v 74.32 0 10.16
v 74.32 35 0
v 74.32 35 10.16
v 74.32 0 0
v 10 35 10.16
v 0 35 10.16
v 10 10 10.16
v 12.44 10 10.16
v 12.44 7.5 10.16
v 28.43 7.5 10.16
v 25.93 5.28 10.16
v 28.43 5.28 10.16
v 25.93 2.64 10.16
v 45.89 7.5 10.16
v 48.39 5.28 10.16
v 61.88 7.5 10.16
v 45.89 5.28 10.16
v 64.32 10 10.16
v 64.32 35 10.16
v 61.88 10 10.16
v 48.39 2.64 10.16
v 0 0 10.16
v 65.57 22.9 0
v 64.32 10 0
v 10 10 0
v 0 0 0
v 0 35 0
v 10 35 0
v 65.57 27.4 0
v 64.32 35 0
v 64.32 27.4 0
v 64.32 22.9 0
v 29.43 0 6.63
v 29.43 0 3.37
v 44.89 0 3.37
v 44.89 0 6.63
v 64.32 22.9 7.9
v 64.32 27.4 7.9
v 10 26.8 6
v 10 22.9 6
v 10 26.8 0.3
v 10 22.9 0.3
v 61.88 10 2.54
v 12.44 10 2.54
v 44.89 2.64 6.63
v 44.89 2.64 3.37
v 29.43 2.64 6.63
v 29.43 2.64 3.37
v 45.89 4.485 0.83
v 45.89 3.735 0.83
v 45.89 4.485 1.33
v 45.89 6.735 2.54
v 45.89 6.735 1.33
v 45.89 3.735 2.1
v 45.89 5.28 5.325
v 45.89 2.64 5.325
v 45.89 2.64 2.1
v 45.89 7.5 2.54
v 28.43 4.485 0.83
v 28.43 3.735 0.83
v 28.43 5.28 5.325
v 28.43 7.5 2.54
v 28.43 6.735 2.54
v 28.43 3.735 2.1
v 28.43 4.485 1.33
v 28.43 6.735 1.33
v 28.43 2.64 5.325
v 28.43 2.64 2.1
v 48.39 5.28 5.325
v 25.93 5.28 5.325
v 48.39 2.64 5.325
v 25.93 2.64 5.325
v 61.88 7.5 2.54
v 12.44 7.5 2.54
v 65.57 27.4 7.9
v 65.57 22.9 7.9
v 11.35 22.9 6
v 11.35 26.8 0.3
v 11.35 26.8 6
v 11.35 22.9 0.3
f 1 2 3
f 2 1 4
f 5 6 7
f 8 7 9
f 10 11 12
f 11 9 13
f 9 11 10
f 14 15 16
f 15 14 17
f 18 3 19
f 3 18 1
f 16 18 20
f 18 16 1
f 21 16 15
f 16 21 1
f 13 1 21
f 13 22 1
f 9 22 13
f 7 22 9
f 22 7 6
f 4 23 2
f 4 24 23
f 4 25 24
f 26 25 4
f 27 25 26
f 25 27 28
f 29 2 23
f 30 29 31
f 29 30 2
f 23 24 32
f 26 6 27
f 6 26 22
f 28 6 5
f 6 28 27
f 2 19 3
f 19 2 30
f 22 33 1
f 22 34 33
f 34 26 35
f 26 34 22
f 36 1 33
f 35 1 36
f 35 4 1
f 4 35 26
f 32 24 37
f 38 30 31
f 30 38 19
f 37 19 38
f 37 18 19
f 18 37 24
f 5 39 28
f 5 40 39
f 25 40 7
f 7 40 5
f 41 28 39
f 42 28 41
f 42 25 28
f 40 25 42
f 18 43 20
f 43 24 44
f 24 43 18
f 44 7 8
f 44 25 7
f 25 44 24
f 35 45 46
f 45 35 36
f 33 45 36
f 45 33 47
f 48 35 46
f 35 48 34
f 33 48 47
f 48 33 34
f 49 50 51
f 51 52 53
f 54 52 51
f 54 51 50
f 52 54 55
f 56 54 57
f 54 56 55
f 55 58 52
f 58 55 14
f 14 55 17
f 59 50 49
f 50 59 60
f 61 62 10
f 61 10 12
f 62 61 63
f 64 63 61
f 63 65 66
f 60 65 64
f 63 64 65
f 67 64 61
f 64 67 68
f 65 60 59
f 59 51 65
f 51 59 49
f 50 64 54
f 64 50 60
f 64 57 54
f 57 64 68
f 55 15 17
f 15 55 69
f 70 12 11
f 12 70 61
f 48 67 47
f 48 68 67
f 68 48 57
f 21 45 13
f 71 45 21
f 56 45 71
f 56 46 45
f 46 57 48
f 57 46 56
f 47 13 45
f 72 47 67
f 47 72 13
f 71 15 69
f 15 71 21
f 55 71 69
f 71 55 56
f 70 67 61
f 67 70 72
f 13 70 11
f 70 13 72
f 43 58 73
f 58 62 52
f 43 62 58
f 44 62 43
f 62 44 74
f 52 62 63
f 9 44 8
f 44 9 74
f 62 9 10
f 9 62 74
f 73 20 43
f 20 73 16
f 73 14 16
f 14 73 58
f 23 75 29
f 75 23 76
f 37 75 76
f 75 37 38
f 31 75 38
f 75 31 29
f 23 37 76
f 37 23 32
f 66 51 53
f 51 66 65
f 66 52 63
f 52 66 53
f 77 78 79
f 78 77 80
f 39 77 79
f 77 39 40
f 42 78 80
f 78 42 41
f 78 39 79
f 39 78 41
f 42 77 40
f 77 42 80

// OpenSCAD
inch = 25.4;
pin_width = 0.65;
back_offset = 1.52 - pin_width/2;
pitch = 2.54;
con_thk = 3.06+0.2; // measured April 16, 2014

con_length  = 6*pitch+0.22;
tail =2.54;
board_wd = 54.22 + 0.1;
arm_wd = 10;

x_slot_edge = board_wd/2-con_length/2-7/2+arm_wd;

tab_y =17.2;
tab_yh = 16.9;
tab_y_w = 4.4;
tab_x_w = 1.5;
tabhole_y_w = 4.1;

difference()
{
    cube([board_wd+2*arm_wd, 25+arm_wd, 0.4*inch]);
    translate([arm_wd, arm_wd, -2])
    {
         cube([board_wd, 25+arm_wd, 0.4*inch+4]);
    }  // space for board
    translate([board_wd/2-con_length/2+arm_wd, -1, arm_wd/2-con_thk/2])
    {
         cube([con_length, 1+2.54+2, con_thk]);
    }   // space for body  of connector
    translate([board_wd/2-con_length/2-2/2+arm_wd, 2.54+back_offset, arm_wd/2-con_thk/2 - tail])
    {
         cube([con_length+2, pin_width+0.1, 12]);
    }   // space for tail   of connector and access
    translate([board_wd/2-con_length/2-2/2+arm_wd, 2.54+0.1, arm_wd/2-con_thk/2 - tail/2])
    {
         cube([con_length+2, 2.54+0.1, 12]);
    }   // space for solder connections


    translate([x_slot_edge, 2.54+0.1, arm_wd/2+pin_width/2])
    {
         cube([con_length+7, 2.54+0.1, 12]);
    }   // slot for insert

    translate([10-0.1+2.54, 7.5, 2.54])
    {
         cube([con_length+3.5, 2.54+0.1, 12]);
    }   // slot1 for wires
    translate([board_wd+arm_wd-(con_length+3.5)+0.1-2.54, 7.5, 2.54])
    {
         cube([con_length+3.5, 2.54+0.1, 12]);
    }   // slot2 for wires

translate([arm_wd+board_wd-0.1, arm_wd+tab_y-tab_y_w+0.1, -0.1])
    {
        cube([tab_x_w-0.15, tab_y_w+.1,7+1]);
    } // tab hole


    translate([board_wd/2-con_length/2-2/2+arm_wd, 2.54+back_offset , arm_wd/2-con_thk/2 - tail+0.5])
    {
         cube([con_length+2, 3, 12]);
    }   // space for access             
    translate([board_wd/2-con_length/2-2/2+arm_wd, 2.54+back_offset , 2.54])
    {
         cube([con_length+2, 10, 12]);
    }   // space for access 
}

translate([arm_wd-0.1, arm_wd+tab_yh-tabhole_y_w+0.1, 0.3])
    {
        cube([tab_x_w-0.15+0.1, tabhole_y_w-.2,7-1.3]);
    }
